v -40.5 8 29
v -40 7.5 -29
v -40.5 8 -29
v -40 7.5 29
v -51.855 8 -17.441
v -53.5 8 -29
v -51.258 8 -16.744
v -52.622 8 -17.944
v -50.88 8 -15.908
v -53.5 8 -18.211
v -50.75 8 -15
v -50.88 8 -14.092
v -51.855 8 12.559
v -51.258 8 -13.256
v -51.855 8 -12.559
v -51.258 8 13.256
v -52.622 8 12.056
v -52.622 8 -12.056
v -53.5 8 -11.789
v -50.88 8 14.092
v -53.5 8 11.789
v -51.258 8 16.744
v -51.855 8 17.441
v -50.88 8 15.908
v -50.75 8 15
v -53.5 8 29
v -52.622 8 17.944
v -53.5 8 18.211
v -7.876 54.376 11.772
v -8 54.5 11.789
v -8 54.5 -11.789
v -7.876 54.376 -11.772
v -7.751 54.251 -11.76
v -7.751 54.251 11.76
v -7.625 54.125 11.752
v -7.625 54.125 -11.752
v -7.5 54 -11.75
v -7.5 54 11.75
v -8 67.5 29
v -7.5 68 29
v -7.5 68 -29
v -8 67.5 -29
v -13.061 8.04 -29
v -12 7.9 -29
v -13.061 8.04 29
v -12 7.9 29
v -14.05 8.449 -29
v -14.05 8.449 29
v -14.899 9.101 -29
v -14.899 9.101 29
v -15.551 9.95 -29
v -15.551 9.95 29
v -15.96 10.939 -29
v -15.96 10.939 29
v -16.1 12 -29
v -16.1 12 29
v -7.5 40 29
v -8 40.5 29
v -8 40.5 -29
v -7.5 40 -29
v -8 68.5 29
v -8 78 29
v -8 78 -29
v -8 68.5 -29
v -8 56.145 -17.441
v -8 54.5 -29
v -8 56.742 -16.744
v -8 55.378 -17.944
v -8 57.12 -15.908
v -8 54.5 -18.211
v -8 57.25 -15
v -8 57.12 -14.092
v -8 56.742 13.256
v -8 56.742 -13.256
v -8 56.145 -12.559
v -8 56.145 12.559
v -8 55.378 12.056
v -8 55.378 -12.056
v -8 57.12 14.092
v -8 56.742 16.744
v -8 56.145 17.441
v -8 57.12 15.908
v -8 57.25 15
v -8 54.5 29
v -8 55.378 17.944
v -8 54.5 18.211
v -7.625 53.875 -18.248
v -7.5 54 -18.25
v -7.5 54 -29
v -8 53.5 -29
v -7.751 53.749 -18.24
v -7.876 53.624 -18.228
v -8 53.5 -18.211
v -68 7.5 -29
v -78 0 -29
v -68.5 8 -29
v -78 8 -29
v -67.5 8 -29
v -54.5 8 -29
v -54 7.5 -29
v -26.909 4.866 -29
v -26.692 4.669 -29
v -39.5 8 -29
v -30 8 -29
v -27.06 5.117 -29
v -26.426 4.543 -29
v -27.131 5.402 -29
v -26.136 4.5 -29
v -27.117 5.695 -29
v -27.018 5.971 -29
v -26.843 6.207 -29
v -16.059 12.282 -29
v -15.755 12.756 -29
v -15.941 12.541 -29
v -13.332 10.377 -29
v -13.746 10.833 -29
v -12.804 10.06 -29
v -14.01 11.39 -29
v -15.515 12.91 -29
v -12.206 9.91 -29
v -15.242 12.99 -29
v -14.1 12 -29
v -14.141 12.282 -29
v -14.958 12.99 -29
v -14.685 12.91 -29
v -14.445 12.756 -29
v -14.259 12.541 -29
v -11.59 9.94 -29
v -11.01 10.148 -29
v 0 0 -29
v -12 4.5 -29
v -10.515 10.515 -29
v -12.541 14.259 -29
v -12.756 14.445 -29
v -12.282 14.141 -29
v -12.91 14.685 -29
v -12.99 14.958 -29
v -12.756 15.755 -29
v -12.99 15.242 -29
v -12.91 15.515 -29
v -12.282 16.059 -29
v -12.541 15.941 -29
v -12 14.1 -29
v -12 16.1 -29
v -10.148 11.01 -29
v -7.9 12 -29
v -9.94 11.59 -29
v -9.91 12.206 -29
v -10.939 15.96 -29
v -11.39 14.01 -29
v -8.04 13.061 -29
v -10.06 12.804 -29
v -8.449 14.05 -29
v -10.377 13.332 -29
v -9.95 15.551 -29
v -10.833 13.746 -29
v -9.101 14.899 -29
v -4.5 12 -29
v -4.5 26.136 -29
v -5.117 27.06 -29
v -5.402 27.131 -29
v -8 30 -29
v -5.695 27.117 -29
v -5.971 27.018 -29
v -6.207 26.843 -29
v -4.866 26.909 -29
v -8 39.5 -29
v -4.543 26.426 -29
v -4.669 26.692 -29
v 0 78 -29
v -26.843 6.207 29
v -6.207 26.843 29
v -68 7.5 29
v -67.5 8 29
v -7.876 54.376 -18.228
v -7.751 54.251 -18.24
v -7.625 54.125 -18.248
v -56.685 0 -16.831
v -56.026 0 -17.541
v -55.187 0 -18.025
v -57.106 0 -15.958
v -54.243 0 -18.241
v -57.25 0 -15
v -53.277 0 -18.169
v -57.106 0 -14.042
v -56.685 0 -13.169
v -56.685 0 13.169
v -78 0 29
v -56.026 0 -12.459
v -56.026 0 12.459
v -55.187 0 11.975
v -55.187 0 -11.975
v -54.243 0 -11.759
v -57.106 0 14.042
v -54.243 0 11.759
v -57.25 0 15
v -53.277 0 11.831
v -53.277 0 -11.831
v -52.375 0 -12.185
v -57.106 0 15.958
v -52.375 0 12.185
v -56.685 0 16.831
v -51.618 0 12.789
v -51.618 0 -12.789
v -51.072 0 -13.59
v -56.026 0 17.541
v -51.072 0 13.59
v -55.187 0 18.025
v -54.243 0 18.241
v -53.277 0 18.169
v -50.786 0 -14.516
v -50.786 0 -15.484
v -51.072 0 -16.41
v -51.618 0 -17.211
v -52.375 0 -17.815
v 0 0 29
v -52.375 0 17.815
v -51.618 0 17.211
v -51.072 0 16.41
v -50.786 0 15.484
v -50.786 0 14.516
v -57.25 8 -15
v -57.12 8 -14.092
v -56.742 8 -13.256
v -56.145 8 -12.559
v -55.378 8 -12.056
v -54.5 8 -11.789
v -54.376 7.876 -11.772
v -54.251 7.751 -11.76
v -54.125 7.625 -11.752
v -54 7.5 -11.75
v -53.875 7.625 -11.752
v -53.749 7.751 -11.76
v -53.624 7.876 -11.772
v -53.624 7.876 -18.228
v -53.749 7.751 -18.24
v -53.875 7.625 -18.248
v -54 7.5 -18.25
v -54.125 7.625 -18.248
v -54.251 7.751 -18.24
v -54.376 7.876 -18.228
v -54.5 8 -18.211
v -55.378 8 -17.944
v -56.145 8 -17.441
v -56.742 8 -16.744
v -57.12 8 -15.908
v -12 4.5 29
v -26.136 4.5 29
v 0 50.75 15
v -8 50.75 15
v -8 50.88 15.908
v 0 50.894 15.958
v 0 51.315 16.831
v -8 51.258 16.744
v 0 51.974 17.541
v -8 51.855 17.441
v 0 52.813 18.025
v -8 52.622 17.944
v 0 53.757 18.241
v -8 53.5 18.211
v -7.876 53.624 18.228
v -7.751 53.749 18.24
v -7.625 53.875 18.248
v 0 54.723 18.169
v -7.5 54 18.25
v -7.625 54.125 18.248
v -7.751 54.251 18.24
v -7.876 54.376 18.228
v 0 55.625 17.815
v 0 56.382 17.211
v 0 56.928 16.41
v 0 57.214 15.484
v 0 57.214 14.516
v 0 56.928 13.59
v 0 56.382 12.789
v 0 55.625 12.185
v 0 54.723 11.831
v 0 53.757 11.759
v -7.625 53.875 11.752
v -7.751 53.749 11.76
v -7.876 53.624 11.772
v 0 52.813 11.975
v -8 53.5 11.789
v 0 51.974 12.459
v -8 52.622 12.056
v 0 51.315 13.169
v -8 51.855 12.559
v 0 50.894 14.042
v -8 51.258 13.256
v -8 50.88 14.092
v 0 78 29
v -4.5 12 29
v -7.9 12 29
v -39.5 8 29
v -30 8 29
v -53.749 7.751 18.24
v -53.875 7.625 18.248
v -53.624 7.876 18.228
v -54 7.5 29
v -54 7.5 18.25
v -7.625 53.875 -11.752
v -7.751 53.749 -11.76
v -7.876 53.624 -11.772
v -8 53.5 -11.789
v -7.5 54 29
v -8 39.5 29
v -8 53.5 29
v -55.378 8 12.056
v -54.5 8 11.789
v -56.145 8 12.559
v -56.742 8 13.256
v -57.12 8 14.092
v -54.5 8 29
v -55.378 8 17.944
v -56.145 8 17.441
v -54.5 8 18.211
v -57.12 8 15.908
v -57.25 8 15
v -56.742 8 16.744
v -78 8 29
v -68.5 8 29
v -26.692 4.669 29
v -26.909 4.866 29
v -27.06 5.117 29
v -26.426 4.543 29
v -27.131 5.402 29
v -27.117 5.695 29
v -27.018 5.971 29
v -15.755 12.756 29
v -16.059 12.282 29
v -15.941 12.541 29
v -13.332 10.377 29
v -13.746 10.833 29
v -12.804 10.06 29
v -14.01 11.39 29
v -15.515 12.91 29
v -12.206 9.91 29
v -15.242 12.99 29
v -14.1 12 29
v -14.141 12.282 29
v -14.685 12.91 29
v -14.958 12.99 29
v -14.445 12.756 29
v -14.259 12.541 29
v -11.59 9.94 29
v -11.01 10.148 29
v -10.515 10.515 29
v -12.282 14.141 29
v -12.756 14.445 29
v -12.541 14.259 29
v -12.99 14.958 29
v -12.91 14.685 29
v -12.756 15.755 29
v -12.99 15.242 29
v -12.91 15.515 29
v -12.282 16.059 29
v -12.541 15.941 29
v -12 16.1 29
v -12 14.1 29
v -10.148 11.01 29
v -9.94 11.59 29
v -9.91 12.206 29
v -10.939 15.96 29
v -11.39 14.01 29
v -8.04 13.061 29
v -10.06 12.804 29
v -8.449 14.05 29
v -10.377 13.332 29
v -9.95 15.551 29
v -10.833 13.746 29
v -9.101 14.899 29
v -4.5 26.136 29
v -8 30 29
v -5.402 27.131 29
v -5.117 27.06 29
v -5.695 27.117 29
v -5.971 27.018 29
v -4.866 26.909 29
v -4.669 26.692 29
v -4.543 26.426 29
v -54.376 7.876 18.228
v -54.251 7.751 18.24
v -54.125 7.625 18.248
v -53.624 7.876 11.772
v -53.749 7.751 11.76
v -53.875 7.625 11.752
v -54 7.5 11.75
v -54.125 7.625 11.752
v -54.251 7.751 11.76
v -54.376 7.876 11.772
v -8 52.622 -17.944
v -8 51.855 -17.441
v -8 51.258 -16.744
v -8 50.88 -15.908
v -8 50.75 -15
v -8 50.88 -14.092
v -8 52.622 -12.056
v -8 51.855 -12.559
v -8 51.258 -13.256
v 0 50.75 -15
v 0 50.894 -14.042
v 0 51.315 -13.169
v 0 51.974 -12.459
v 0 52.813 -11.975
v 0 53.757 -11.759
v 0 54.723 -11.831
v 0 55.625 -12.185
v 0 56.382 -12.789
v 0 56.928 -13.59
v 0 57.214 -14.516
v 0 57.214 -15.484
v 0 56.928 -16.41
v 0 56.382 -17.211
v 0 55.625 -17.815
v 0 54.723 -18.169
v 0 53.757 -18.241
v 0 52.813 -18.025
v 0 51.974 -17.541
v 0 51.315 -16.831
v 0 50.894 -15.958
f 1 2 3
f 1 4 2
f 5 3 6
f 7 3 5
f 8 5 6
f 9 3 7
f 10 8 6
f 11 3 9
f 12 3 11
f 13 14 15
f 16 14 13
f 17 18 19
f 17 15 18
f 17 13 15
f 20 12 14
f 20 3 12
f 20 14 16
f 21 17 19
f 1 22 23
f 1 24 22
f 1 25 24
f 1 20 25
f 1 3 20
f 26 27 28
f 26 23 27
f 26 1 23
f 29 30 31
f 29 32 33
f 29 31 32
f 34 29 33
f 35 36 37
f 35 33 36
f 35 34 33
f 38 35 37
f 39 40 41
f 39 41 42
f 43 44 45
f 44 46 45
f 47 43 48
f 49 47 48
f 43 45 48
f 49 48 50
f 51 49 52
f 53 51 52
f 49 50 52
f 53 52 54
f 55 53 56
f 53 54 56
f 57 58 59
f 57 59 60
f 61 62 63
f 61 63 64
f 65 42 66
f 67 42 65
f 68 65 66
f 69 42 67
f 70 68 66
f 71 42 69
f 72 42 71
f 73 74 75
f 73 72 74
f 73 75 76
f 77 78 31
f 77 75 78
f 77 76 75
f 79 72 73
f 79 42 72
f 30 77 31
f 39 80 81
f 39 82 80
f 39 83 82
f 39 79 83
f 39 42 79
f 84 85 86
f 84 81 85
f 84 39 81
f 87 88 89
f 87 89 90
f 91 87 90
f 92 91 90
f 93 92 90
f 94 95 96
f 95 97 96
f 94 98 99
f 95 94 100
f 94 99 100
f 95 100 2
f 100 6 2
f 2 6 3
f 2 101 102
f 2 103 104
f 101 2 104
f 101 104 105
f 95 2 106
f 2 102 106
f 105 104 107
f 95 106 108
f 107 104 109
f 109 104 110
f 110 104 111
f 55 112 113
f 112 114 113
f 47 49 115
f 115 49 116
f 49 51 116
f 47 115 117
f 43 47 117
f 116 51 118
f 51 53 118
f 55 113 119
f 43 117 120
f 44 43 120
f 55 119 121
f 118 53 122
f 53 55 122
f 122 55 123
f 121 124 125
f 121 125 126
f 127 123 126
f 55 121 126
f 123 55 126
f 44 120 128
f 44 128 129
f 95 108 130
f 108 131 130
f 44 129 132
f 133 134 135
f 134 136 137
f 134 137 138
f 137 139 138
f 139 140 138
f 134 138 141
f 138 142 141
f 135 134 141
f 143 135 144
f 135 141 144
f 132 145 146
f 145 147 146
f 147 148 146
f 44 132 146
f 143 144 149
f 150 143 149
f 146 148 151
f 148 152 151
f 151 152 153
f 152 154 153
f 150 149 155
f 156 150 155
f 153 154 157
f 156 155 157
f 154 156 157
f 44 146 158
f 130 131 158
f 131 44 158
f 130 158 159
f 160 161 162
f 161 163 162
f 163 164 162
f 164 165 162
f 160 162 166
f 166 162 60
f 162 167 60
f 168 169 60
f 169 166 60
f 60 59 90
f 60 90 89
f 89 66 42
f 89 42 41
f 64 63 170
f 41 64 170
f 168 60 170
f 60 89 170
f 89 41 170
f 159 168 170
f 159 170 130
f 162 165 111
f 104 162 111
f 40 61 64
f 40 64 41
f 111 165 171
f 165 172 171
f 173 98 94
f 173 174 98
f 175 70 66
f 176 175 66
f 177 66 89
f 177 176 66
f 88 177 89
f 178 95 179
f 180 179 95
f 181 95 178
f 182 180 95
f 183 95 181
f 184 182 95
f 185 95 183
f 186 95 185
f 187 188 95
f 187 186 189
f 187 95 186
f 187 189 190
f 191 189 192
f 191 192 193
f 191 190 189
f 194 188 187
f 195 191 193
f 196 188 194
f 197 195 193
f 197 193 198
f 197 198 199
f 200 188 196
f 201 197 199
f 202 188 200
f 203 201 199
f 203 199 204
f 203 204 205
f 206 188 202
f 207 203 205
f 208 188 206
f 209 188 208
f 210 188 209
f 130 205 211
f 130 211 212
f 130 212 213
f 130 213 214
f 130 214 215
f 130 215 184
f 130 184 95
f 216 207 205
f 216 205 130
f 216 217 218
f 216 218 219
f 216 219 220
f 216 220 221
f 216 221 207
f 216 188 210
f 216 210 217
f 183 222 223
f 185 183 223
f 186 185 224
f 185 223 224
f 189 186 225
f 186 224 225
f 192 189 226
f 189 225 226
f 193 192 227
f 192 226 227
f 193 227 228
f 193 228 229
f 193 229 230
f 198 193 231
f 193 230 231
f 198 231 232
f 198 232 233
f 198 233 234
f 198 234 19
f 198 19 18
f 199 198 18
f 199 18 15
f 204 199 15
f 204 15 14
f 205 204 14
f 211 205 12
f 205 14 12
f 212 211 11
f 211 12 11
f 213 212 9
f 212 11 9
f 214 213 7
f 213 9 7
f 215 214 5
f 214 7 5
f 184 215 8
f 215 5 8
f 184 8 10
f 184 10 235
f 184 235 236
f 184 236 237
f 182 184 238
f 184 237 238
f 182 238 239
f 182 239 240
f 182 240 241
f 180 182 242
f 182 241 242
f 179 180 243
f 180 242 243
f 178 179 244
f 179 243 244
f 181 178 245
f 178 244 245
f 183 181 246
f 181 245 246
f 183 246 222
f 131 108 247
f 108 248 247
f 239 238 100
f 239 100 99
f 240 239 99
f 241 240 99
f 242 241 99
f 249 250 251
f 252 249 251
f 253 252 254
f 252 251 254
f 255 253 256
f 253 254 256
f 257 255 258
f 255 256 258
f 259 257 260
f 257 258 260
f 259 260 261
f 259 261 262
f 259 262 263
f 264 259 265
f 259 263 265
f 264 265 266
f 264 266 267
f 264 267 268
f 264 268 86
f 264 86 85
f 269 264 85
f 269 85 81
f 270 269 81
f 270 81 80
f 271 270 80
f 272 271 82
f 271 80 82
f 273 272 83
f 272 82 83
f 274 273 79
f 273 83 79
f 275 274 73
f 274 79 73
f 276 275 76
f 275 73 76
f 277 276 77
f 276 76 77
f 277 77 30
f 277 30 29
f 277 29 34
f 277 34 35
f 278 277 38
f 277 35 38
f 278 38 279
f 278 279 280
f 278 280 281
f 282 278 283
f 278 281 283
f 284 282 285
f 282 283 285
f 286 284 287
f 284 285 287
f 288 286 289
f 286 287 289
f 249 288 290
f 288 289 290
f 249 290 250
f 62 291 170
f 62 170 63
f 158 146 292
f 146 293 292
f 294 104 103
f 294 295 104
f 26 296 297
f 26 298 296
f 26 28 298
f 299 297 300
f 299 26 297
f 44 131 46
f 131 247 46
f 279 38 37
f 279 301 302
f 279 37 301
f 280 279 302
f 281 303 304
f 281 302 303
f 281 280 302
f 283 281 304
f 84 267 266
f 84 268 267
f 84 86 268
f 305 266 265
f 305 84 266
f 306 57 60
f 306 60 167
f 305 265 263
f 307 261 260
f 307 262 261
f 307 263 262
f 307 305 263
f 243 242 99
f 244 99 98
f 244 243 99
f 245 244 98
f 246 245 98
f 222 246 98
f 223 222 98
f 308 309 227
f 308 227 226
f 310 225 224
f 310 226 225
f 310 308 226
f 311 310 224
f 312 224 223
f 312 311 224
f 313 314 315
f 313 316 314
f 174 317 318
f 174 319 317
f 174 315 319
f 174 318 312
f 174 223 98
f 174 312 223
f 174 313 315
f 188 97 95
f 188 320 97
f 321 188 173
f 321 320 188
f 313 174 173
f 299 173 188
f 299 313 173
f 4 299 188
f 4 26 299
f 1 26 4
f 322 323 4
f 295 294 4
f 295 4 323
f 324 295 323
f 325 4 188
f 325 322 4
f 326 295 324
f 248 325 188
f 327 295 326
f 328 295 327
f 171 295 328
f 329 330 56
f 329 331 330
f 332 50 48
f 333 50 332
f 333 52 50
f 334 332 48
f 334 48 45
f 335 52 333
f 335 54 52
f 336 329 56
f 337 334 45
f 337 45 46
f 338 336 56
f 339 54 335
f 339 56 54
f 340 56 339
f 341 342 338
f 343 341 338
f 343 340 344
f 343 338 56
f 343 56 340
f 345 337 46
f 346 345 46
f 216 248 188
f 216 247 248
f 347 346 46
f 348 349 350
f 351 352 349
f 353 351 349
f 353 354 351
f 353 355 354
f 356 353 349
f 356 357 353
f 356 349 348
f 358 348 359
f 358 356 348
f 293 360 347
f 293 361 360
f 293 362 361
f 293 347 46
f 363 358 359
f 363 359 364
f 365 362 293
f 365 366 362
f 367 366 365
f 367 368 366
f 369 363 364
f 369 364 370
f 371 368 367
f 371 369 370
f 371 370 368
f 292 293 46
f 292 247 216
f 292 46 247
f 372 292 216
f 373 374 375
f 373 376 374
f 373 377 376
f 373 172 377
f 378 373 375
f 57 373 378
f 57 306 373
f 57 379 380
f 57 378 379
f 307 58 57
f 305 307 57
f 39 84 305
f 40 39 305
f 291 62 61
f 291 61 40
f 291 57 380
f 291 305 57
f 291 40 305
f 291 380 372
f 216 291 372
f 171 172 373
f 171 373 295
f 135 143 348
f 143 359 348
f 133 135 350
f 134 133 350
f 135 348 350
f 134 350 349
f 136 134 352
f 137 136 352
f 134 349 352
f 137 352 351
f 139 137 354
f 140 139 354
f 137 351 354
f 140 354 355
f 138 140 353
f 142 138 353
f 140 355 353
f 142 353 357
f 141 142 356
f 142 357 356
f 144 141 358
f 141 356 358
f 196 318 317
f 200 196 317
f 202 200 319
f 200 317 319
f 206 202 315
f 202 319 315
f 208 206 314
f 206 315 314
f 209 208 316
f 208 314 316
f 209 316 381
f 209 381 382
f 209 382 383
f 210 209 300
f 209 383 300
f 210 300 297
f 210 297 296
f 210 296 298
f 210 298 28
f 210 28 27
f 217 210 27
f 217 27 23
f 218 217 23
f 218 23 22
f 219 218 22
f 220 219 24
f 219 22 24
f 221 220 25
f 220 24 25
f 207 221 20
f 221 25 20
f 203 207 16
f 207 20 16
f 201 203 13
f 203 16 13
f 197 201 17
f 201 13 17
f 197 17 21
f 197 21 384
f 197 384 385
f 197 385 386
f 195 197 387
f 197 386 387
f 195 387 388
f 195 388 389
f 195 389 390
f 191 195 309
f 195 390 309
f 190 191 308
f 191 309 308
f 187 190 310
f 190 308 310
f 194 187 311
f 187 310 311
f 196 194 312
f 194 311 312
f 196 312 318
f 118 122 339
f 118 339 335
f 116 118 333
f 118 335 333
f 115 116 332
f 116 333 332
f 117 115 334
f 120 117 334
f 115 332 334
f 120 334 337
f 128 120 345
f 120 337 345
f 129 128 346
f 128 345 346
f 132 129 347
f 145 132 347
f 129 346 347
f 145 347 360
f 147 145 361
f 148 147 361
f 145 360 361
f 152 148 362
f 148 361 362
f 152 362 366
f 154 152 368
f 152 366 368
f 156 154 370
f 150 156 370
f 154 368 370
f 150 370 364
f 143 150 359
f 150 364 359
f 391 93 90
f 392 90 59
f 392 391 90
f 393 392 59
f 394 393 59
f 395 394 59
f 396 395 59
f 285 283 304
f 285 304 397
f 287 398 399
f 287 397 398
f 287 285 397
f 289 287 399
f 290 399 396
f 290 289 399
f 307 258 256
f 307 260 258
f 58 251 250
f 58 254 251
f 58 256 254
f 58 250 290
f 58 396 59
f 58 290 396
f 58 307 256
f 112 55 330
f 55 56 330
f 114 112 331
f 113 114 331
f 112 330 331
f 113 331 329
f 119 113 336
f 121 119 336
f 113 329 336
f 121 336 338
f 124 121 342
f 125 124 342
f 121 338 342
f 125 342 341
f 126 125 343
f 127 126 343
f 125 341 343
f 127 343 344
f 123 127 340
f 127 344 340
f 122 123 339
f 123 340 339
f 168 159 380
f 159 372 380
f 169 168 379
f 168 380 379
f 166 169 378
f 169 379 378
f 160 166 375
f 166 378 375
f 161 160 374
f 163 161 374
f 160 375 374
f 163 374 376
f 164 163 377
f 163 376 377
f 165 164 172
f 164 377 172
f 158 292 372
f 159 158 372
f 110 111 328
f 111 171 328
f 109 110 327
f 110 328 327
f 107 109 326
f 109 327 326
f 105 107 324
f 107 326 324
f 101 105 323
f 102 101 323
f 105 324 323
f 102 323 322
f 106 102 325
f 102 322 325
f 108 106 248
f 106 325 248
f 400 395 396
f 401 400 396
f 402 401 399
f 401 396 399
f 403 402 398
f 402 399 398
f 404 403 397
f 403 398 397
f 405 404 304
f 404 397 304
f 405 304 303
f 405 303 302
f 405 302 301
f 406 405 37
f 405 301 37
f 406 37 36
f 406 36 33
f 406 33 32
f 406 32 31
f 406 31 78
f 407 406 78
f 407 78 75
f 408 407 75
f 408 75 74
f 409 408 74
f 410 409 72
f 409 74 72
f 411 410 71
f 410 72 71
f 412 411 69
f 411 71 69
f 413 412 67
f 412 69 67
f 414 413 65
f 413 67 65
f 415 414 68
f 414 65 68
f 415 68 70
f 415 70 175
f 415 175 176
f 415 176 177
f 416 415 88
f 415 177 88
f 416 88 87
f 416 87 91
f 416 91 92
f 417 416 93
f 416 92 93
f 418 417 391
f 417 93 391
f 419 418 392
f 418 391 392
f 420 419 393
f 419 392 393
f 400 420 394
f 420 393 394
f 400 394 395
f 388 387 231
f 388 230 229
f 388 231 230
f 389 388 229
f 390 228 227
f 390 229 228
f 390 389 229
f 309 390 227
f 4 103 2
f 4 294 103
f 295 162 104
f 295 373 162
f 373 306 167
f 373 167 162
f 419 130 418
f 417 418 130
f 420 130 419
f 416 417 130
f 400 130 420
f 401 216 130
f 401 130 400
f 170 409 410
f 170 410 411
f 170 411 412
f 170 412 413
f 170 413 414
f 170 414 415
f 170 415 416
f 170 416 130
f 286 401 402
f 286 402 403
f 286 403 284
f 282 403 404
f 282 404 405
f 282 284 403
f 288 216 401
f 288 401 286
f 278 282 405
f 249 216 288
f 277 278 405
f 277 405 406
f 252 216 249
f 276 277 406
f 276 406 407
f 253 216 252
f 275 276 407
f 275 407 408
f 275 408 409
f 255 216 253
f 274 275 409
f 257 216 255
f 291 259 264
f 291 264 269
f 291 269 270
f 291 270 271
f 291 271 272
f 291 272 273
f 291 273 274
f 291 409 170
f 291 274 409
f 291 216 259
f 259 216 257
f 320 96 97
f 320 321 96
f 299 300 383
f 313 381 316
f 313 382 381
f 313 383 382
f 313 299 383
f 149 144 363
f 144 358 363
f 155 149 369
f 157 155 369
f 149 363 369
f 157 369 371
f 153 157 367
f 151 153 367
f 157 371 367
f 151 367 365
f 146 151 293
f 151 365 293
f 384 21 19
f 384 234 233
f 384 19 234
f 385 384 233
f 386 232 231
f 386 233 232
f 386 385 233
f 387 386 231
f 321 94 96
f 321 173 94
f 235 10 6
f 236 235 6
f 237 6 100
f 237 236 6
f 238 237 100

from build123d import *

# Parameters (mm, degrees)
EXTRUDE_1_DEPTH     = 29
SKETCH_2_R          = 3.25
CUT_EXTRUDE_1_DEPTH = 9
SKETCH_3_R          = 3.25
CUT_EXTRUDE_2_DEPTH = 9


with BuildPart() as part:
    # Эскиз1 → Бобышка-Вытянуть1 (new body, symmetric)
    with BuildSketch(Plane.XY):
        Polygon((-78, 0), (0, 0), (0, 78), (-8, 78), (-8, 68.5), (-7.5, 68), (-8, 67.5), (-8, 54.5), (-7.5, 54), (-8, 53.5), (-8, 40.5), (-7.5, 40), (-8, 39.5), (-8, 30), (-30, 8), (-39.5, 8), (-40, 7.5), (-40.5, 8), (-53.5, 8), (-54, 7.5), (-54.5, 8), (-67.5, 8), (-68, 7.5), (-68.5, 8), (-78, 8), align=None)
        with BuildLine():
            Line((-4.5, 12), (-4.5, 26.136038969))
            ThreePointArc((-4.5, 26.136038969), (-5.117316568, 27.059918502), (-6.207106781, 26.843145751))
            Line((-6.207106781, 26.843145751), (-26.843145751, 6.207106781))
            ThreePointArc((-26.843145751, 6.207106781), (-27.059918502, 5.117316568), (-26.136038969, 4.5))
            Line((-26.136038969, 4.5), (-12, 4.5))
            Line((-12, 4.5), (-12, 7.9))
            ThreePointArc((-12, 7.9), (-14.899137803, 9.100862197), (-16.1, 12))
            ThreePointArc((-16.1, 12), (-15.1, 13), (-14.1, 12))
            ThreePointArc((-14.1, 12), (-10.51507576, 10.51507576), (-12, 14.1))
            ThreePointArc((-12, 14.1), (-13, 15.1), (-12, 16.1))
            ThreePointArc((-12, 16.1), (-9.100862197, 14.899137803), (-7.9, 12))
            Line((-7.9, 12), (-4.5, 12))
        make_face(mode=Mode.SUBTRACT)
    extrude(amount=EXTRUDE_1_DEPTH, both=True)

    # Эскиз2 → Вырез-Вытянуть1 (cut, through all)
    with BuildSketch(Plane.ZY.offset(8)):
        with Locations(Location((-15, 54, 0), (0, 0, 270))):  # turned: the seam where the file's is
            Circle(SKETCH_2_R)
        with Locations(Location((15, 54, 0), (0, 0, 270))):  # turned: the seam where the file's is
            Circle(SKETCH_2_R)
    extrude(amount=-CUT_EXTRUDE_1_DEPTH, mode=Mode.SUBTRACT)

    # Эскиз3 → Вырез-Вытянуть2 (cut, through all)
    with BuildSketch(Plane(origin=(0, 8, 0), x_dir=(1, 0, 0), z_dir=(0, 1, 0))):
        with Locations(Location((-54, -15, 0), (0, 0, 180))):  # turned: the seam where the file's is
            Circle(SKETCH_3_R)
        with Locations(Location((-54, 15, 0), (0, 0, 180))):  # turned: the seam where the file's is
            Circle(SKETCH_3_R)
    extrude(amount=-CUT_EXTRUDE_2_DEPTH, mode=Mode.SUBTRACT)


solid = part.part
